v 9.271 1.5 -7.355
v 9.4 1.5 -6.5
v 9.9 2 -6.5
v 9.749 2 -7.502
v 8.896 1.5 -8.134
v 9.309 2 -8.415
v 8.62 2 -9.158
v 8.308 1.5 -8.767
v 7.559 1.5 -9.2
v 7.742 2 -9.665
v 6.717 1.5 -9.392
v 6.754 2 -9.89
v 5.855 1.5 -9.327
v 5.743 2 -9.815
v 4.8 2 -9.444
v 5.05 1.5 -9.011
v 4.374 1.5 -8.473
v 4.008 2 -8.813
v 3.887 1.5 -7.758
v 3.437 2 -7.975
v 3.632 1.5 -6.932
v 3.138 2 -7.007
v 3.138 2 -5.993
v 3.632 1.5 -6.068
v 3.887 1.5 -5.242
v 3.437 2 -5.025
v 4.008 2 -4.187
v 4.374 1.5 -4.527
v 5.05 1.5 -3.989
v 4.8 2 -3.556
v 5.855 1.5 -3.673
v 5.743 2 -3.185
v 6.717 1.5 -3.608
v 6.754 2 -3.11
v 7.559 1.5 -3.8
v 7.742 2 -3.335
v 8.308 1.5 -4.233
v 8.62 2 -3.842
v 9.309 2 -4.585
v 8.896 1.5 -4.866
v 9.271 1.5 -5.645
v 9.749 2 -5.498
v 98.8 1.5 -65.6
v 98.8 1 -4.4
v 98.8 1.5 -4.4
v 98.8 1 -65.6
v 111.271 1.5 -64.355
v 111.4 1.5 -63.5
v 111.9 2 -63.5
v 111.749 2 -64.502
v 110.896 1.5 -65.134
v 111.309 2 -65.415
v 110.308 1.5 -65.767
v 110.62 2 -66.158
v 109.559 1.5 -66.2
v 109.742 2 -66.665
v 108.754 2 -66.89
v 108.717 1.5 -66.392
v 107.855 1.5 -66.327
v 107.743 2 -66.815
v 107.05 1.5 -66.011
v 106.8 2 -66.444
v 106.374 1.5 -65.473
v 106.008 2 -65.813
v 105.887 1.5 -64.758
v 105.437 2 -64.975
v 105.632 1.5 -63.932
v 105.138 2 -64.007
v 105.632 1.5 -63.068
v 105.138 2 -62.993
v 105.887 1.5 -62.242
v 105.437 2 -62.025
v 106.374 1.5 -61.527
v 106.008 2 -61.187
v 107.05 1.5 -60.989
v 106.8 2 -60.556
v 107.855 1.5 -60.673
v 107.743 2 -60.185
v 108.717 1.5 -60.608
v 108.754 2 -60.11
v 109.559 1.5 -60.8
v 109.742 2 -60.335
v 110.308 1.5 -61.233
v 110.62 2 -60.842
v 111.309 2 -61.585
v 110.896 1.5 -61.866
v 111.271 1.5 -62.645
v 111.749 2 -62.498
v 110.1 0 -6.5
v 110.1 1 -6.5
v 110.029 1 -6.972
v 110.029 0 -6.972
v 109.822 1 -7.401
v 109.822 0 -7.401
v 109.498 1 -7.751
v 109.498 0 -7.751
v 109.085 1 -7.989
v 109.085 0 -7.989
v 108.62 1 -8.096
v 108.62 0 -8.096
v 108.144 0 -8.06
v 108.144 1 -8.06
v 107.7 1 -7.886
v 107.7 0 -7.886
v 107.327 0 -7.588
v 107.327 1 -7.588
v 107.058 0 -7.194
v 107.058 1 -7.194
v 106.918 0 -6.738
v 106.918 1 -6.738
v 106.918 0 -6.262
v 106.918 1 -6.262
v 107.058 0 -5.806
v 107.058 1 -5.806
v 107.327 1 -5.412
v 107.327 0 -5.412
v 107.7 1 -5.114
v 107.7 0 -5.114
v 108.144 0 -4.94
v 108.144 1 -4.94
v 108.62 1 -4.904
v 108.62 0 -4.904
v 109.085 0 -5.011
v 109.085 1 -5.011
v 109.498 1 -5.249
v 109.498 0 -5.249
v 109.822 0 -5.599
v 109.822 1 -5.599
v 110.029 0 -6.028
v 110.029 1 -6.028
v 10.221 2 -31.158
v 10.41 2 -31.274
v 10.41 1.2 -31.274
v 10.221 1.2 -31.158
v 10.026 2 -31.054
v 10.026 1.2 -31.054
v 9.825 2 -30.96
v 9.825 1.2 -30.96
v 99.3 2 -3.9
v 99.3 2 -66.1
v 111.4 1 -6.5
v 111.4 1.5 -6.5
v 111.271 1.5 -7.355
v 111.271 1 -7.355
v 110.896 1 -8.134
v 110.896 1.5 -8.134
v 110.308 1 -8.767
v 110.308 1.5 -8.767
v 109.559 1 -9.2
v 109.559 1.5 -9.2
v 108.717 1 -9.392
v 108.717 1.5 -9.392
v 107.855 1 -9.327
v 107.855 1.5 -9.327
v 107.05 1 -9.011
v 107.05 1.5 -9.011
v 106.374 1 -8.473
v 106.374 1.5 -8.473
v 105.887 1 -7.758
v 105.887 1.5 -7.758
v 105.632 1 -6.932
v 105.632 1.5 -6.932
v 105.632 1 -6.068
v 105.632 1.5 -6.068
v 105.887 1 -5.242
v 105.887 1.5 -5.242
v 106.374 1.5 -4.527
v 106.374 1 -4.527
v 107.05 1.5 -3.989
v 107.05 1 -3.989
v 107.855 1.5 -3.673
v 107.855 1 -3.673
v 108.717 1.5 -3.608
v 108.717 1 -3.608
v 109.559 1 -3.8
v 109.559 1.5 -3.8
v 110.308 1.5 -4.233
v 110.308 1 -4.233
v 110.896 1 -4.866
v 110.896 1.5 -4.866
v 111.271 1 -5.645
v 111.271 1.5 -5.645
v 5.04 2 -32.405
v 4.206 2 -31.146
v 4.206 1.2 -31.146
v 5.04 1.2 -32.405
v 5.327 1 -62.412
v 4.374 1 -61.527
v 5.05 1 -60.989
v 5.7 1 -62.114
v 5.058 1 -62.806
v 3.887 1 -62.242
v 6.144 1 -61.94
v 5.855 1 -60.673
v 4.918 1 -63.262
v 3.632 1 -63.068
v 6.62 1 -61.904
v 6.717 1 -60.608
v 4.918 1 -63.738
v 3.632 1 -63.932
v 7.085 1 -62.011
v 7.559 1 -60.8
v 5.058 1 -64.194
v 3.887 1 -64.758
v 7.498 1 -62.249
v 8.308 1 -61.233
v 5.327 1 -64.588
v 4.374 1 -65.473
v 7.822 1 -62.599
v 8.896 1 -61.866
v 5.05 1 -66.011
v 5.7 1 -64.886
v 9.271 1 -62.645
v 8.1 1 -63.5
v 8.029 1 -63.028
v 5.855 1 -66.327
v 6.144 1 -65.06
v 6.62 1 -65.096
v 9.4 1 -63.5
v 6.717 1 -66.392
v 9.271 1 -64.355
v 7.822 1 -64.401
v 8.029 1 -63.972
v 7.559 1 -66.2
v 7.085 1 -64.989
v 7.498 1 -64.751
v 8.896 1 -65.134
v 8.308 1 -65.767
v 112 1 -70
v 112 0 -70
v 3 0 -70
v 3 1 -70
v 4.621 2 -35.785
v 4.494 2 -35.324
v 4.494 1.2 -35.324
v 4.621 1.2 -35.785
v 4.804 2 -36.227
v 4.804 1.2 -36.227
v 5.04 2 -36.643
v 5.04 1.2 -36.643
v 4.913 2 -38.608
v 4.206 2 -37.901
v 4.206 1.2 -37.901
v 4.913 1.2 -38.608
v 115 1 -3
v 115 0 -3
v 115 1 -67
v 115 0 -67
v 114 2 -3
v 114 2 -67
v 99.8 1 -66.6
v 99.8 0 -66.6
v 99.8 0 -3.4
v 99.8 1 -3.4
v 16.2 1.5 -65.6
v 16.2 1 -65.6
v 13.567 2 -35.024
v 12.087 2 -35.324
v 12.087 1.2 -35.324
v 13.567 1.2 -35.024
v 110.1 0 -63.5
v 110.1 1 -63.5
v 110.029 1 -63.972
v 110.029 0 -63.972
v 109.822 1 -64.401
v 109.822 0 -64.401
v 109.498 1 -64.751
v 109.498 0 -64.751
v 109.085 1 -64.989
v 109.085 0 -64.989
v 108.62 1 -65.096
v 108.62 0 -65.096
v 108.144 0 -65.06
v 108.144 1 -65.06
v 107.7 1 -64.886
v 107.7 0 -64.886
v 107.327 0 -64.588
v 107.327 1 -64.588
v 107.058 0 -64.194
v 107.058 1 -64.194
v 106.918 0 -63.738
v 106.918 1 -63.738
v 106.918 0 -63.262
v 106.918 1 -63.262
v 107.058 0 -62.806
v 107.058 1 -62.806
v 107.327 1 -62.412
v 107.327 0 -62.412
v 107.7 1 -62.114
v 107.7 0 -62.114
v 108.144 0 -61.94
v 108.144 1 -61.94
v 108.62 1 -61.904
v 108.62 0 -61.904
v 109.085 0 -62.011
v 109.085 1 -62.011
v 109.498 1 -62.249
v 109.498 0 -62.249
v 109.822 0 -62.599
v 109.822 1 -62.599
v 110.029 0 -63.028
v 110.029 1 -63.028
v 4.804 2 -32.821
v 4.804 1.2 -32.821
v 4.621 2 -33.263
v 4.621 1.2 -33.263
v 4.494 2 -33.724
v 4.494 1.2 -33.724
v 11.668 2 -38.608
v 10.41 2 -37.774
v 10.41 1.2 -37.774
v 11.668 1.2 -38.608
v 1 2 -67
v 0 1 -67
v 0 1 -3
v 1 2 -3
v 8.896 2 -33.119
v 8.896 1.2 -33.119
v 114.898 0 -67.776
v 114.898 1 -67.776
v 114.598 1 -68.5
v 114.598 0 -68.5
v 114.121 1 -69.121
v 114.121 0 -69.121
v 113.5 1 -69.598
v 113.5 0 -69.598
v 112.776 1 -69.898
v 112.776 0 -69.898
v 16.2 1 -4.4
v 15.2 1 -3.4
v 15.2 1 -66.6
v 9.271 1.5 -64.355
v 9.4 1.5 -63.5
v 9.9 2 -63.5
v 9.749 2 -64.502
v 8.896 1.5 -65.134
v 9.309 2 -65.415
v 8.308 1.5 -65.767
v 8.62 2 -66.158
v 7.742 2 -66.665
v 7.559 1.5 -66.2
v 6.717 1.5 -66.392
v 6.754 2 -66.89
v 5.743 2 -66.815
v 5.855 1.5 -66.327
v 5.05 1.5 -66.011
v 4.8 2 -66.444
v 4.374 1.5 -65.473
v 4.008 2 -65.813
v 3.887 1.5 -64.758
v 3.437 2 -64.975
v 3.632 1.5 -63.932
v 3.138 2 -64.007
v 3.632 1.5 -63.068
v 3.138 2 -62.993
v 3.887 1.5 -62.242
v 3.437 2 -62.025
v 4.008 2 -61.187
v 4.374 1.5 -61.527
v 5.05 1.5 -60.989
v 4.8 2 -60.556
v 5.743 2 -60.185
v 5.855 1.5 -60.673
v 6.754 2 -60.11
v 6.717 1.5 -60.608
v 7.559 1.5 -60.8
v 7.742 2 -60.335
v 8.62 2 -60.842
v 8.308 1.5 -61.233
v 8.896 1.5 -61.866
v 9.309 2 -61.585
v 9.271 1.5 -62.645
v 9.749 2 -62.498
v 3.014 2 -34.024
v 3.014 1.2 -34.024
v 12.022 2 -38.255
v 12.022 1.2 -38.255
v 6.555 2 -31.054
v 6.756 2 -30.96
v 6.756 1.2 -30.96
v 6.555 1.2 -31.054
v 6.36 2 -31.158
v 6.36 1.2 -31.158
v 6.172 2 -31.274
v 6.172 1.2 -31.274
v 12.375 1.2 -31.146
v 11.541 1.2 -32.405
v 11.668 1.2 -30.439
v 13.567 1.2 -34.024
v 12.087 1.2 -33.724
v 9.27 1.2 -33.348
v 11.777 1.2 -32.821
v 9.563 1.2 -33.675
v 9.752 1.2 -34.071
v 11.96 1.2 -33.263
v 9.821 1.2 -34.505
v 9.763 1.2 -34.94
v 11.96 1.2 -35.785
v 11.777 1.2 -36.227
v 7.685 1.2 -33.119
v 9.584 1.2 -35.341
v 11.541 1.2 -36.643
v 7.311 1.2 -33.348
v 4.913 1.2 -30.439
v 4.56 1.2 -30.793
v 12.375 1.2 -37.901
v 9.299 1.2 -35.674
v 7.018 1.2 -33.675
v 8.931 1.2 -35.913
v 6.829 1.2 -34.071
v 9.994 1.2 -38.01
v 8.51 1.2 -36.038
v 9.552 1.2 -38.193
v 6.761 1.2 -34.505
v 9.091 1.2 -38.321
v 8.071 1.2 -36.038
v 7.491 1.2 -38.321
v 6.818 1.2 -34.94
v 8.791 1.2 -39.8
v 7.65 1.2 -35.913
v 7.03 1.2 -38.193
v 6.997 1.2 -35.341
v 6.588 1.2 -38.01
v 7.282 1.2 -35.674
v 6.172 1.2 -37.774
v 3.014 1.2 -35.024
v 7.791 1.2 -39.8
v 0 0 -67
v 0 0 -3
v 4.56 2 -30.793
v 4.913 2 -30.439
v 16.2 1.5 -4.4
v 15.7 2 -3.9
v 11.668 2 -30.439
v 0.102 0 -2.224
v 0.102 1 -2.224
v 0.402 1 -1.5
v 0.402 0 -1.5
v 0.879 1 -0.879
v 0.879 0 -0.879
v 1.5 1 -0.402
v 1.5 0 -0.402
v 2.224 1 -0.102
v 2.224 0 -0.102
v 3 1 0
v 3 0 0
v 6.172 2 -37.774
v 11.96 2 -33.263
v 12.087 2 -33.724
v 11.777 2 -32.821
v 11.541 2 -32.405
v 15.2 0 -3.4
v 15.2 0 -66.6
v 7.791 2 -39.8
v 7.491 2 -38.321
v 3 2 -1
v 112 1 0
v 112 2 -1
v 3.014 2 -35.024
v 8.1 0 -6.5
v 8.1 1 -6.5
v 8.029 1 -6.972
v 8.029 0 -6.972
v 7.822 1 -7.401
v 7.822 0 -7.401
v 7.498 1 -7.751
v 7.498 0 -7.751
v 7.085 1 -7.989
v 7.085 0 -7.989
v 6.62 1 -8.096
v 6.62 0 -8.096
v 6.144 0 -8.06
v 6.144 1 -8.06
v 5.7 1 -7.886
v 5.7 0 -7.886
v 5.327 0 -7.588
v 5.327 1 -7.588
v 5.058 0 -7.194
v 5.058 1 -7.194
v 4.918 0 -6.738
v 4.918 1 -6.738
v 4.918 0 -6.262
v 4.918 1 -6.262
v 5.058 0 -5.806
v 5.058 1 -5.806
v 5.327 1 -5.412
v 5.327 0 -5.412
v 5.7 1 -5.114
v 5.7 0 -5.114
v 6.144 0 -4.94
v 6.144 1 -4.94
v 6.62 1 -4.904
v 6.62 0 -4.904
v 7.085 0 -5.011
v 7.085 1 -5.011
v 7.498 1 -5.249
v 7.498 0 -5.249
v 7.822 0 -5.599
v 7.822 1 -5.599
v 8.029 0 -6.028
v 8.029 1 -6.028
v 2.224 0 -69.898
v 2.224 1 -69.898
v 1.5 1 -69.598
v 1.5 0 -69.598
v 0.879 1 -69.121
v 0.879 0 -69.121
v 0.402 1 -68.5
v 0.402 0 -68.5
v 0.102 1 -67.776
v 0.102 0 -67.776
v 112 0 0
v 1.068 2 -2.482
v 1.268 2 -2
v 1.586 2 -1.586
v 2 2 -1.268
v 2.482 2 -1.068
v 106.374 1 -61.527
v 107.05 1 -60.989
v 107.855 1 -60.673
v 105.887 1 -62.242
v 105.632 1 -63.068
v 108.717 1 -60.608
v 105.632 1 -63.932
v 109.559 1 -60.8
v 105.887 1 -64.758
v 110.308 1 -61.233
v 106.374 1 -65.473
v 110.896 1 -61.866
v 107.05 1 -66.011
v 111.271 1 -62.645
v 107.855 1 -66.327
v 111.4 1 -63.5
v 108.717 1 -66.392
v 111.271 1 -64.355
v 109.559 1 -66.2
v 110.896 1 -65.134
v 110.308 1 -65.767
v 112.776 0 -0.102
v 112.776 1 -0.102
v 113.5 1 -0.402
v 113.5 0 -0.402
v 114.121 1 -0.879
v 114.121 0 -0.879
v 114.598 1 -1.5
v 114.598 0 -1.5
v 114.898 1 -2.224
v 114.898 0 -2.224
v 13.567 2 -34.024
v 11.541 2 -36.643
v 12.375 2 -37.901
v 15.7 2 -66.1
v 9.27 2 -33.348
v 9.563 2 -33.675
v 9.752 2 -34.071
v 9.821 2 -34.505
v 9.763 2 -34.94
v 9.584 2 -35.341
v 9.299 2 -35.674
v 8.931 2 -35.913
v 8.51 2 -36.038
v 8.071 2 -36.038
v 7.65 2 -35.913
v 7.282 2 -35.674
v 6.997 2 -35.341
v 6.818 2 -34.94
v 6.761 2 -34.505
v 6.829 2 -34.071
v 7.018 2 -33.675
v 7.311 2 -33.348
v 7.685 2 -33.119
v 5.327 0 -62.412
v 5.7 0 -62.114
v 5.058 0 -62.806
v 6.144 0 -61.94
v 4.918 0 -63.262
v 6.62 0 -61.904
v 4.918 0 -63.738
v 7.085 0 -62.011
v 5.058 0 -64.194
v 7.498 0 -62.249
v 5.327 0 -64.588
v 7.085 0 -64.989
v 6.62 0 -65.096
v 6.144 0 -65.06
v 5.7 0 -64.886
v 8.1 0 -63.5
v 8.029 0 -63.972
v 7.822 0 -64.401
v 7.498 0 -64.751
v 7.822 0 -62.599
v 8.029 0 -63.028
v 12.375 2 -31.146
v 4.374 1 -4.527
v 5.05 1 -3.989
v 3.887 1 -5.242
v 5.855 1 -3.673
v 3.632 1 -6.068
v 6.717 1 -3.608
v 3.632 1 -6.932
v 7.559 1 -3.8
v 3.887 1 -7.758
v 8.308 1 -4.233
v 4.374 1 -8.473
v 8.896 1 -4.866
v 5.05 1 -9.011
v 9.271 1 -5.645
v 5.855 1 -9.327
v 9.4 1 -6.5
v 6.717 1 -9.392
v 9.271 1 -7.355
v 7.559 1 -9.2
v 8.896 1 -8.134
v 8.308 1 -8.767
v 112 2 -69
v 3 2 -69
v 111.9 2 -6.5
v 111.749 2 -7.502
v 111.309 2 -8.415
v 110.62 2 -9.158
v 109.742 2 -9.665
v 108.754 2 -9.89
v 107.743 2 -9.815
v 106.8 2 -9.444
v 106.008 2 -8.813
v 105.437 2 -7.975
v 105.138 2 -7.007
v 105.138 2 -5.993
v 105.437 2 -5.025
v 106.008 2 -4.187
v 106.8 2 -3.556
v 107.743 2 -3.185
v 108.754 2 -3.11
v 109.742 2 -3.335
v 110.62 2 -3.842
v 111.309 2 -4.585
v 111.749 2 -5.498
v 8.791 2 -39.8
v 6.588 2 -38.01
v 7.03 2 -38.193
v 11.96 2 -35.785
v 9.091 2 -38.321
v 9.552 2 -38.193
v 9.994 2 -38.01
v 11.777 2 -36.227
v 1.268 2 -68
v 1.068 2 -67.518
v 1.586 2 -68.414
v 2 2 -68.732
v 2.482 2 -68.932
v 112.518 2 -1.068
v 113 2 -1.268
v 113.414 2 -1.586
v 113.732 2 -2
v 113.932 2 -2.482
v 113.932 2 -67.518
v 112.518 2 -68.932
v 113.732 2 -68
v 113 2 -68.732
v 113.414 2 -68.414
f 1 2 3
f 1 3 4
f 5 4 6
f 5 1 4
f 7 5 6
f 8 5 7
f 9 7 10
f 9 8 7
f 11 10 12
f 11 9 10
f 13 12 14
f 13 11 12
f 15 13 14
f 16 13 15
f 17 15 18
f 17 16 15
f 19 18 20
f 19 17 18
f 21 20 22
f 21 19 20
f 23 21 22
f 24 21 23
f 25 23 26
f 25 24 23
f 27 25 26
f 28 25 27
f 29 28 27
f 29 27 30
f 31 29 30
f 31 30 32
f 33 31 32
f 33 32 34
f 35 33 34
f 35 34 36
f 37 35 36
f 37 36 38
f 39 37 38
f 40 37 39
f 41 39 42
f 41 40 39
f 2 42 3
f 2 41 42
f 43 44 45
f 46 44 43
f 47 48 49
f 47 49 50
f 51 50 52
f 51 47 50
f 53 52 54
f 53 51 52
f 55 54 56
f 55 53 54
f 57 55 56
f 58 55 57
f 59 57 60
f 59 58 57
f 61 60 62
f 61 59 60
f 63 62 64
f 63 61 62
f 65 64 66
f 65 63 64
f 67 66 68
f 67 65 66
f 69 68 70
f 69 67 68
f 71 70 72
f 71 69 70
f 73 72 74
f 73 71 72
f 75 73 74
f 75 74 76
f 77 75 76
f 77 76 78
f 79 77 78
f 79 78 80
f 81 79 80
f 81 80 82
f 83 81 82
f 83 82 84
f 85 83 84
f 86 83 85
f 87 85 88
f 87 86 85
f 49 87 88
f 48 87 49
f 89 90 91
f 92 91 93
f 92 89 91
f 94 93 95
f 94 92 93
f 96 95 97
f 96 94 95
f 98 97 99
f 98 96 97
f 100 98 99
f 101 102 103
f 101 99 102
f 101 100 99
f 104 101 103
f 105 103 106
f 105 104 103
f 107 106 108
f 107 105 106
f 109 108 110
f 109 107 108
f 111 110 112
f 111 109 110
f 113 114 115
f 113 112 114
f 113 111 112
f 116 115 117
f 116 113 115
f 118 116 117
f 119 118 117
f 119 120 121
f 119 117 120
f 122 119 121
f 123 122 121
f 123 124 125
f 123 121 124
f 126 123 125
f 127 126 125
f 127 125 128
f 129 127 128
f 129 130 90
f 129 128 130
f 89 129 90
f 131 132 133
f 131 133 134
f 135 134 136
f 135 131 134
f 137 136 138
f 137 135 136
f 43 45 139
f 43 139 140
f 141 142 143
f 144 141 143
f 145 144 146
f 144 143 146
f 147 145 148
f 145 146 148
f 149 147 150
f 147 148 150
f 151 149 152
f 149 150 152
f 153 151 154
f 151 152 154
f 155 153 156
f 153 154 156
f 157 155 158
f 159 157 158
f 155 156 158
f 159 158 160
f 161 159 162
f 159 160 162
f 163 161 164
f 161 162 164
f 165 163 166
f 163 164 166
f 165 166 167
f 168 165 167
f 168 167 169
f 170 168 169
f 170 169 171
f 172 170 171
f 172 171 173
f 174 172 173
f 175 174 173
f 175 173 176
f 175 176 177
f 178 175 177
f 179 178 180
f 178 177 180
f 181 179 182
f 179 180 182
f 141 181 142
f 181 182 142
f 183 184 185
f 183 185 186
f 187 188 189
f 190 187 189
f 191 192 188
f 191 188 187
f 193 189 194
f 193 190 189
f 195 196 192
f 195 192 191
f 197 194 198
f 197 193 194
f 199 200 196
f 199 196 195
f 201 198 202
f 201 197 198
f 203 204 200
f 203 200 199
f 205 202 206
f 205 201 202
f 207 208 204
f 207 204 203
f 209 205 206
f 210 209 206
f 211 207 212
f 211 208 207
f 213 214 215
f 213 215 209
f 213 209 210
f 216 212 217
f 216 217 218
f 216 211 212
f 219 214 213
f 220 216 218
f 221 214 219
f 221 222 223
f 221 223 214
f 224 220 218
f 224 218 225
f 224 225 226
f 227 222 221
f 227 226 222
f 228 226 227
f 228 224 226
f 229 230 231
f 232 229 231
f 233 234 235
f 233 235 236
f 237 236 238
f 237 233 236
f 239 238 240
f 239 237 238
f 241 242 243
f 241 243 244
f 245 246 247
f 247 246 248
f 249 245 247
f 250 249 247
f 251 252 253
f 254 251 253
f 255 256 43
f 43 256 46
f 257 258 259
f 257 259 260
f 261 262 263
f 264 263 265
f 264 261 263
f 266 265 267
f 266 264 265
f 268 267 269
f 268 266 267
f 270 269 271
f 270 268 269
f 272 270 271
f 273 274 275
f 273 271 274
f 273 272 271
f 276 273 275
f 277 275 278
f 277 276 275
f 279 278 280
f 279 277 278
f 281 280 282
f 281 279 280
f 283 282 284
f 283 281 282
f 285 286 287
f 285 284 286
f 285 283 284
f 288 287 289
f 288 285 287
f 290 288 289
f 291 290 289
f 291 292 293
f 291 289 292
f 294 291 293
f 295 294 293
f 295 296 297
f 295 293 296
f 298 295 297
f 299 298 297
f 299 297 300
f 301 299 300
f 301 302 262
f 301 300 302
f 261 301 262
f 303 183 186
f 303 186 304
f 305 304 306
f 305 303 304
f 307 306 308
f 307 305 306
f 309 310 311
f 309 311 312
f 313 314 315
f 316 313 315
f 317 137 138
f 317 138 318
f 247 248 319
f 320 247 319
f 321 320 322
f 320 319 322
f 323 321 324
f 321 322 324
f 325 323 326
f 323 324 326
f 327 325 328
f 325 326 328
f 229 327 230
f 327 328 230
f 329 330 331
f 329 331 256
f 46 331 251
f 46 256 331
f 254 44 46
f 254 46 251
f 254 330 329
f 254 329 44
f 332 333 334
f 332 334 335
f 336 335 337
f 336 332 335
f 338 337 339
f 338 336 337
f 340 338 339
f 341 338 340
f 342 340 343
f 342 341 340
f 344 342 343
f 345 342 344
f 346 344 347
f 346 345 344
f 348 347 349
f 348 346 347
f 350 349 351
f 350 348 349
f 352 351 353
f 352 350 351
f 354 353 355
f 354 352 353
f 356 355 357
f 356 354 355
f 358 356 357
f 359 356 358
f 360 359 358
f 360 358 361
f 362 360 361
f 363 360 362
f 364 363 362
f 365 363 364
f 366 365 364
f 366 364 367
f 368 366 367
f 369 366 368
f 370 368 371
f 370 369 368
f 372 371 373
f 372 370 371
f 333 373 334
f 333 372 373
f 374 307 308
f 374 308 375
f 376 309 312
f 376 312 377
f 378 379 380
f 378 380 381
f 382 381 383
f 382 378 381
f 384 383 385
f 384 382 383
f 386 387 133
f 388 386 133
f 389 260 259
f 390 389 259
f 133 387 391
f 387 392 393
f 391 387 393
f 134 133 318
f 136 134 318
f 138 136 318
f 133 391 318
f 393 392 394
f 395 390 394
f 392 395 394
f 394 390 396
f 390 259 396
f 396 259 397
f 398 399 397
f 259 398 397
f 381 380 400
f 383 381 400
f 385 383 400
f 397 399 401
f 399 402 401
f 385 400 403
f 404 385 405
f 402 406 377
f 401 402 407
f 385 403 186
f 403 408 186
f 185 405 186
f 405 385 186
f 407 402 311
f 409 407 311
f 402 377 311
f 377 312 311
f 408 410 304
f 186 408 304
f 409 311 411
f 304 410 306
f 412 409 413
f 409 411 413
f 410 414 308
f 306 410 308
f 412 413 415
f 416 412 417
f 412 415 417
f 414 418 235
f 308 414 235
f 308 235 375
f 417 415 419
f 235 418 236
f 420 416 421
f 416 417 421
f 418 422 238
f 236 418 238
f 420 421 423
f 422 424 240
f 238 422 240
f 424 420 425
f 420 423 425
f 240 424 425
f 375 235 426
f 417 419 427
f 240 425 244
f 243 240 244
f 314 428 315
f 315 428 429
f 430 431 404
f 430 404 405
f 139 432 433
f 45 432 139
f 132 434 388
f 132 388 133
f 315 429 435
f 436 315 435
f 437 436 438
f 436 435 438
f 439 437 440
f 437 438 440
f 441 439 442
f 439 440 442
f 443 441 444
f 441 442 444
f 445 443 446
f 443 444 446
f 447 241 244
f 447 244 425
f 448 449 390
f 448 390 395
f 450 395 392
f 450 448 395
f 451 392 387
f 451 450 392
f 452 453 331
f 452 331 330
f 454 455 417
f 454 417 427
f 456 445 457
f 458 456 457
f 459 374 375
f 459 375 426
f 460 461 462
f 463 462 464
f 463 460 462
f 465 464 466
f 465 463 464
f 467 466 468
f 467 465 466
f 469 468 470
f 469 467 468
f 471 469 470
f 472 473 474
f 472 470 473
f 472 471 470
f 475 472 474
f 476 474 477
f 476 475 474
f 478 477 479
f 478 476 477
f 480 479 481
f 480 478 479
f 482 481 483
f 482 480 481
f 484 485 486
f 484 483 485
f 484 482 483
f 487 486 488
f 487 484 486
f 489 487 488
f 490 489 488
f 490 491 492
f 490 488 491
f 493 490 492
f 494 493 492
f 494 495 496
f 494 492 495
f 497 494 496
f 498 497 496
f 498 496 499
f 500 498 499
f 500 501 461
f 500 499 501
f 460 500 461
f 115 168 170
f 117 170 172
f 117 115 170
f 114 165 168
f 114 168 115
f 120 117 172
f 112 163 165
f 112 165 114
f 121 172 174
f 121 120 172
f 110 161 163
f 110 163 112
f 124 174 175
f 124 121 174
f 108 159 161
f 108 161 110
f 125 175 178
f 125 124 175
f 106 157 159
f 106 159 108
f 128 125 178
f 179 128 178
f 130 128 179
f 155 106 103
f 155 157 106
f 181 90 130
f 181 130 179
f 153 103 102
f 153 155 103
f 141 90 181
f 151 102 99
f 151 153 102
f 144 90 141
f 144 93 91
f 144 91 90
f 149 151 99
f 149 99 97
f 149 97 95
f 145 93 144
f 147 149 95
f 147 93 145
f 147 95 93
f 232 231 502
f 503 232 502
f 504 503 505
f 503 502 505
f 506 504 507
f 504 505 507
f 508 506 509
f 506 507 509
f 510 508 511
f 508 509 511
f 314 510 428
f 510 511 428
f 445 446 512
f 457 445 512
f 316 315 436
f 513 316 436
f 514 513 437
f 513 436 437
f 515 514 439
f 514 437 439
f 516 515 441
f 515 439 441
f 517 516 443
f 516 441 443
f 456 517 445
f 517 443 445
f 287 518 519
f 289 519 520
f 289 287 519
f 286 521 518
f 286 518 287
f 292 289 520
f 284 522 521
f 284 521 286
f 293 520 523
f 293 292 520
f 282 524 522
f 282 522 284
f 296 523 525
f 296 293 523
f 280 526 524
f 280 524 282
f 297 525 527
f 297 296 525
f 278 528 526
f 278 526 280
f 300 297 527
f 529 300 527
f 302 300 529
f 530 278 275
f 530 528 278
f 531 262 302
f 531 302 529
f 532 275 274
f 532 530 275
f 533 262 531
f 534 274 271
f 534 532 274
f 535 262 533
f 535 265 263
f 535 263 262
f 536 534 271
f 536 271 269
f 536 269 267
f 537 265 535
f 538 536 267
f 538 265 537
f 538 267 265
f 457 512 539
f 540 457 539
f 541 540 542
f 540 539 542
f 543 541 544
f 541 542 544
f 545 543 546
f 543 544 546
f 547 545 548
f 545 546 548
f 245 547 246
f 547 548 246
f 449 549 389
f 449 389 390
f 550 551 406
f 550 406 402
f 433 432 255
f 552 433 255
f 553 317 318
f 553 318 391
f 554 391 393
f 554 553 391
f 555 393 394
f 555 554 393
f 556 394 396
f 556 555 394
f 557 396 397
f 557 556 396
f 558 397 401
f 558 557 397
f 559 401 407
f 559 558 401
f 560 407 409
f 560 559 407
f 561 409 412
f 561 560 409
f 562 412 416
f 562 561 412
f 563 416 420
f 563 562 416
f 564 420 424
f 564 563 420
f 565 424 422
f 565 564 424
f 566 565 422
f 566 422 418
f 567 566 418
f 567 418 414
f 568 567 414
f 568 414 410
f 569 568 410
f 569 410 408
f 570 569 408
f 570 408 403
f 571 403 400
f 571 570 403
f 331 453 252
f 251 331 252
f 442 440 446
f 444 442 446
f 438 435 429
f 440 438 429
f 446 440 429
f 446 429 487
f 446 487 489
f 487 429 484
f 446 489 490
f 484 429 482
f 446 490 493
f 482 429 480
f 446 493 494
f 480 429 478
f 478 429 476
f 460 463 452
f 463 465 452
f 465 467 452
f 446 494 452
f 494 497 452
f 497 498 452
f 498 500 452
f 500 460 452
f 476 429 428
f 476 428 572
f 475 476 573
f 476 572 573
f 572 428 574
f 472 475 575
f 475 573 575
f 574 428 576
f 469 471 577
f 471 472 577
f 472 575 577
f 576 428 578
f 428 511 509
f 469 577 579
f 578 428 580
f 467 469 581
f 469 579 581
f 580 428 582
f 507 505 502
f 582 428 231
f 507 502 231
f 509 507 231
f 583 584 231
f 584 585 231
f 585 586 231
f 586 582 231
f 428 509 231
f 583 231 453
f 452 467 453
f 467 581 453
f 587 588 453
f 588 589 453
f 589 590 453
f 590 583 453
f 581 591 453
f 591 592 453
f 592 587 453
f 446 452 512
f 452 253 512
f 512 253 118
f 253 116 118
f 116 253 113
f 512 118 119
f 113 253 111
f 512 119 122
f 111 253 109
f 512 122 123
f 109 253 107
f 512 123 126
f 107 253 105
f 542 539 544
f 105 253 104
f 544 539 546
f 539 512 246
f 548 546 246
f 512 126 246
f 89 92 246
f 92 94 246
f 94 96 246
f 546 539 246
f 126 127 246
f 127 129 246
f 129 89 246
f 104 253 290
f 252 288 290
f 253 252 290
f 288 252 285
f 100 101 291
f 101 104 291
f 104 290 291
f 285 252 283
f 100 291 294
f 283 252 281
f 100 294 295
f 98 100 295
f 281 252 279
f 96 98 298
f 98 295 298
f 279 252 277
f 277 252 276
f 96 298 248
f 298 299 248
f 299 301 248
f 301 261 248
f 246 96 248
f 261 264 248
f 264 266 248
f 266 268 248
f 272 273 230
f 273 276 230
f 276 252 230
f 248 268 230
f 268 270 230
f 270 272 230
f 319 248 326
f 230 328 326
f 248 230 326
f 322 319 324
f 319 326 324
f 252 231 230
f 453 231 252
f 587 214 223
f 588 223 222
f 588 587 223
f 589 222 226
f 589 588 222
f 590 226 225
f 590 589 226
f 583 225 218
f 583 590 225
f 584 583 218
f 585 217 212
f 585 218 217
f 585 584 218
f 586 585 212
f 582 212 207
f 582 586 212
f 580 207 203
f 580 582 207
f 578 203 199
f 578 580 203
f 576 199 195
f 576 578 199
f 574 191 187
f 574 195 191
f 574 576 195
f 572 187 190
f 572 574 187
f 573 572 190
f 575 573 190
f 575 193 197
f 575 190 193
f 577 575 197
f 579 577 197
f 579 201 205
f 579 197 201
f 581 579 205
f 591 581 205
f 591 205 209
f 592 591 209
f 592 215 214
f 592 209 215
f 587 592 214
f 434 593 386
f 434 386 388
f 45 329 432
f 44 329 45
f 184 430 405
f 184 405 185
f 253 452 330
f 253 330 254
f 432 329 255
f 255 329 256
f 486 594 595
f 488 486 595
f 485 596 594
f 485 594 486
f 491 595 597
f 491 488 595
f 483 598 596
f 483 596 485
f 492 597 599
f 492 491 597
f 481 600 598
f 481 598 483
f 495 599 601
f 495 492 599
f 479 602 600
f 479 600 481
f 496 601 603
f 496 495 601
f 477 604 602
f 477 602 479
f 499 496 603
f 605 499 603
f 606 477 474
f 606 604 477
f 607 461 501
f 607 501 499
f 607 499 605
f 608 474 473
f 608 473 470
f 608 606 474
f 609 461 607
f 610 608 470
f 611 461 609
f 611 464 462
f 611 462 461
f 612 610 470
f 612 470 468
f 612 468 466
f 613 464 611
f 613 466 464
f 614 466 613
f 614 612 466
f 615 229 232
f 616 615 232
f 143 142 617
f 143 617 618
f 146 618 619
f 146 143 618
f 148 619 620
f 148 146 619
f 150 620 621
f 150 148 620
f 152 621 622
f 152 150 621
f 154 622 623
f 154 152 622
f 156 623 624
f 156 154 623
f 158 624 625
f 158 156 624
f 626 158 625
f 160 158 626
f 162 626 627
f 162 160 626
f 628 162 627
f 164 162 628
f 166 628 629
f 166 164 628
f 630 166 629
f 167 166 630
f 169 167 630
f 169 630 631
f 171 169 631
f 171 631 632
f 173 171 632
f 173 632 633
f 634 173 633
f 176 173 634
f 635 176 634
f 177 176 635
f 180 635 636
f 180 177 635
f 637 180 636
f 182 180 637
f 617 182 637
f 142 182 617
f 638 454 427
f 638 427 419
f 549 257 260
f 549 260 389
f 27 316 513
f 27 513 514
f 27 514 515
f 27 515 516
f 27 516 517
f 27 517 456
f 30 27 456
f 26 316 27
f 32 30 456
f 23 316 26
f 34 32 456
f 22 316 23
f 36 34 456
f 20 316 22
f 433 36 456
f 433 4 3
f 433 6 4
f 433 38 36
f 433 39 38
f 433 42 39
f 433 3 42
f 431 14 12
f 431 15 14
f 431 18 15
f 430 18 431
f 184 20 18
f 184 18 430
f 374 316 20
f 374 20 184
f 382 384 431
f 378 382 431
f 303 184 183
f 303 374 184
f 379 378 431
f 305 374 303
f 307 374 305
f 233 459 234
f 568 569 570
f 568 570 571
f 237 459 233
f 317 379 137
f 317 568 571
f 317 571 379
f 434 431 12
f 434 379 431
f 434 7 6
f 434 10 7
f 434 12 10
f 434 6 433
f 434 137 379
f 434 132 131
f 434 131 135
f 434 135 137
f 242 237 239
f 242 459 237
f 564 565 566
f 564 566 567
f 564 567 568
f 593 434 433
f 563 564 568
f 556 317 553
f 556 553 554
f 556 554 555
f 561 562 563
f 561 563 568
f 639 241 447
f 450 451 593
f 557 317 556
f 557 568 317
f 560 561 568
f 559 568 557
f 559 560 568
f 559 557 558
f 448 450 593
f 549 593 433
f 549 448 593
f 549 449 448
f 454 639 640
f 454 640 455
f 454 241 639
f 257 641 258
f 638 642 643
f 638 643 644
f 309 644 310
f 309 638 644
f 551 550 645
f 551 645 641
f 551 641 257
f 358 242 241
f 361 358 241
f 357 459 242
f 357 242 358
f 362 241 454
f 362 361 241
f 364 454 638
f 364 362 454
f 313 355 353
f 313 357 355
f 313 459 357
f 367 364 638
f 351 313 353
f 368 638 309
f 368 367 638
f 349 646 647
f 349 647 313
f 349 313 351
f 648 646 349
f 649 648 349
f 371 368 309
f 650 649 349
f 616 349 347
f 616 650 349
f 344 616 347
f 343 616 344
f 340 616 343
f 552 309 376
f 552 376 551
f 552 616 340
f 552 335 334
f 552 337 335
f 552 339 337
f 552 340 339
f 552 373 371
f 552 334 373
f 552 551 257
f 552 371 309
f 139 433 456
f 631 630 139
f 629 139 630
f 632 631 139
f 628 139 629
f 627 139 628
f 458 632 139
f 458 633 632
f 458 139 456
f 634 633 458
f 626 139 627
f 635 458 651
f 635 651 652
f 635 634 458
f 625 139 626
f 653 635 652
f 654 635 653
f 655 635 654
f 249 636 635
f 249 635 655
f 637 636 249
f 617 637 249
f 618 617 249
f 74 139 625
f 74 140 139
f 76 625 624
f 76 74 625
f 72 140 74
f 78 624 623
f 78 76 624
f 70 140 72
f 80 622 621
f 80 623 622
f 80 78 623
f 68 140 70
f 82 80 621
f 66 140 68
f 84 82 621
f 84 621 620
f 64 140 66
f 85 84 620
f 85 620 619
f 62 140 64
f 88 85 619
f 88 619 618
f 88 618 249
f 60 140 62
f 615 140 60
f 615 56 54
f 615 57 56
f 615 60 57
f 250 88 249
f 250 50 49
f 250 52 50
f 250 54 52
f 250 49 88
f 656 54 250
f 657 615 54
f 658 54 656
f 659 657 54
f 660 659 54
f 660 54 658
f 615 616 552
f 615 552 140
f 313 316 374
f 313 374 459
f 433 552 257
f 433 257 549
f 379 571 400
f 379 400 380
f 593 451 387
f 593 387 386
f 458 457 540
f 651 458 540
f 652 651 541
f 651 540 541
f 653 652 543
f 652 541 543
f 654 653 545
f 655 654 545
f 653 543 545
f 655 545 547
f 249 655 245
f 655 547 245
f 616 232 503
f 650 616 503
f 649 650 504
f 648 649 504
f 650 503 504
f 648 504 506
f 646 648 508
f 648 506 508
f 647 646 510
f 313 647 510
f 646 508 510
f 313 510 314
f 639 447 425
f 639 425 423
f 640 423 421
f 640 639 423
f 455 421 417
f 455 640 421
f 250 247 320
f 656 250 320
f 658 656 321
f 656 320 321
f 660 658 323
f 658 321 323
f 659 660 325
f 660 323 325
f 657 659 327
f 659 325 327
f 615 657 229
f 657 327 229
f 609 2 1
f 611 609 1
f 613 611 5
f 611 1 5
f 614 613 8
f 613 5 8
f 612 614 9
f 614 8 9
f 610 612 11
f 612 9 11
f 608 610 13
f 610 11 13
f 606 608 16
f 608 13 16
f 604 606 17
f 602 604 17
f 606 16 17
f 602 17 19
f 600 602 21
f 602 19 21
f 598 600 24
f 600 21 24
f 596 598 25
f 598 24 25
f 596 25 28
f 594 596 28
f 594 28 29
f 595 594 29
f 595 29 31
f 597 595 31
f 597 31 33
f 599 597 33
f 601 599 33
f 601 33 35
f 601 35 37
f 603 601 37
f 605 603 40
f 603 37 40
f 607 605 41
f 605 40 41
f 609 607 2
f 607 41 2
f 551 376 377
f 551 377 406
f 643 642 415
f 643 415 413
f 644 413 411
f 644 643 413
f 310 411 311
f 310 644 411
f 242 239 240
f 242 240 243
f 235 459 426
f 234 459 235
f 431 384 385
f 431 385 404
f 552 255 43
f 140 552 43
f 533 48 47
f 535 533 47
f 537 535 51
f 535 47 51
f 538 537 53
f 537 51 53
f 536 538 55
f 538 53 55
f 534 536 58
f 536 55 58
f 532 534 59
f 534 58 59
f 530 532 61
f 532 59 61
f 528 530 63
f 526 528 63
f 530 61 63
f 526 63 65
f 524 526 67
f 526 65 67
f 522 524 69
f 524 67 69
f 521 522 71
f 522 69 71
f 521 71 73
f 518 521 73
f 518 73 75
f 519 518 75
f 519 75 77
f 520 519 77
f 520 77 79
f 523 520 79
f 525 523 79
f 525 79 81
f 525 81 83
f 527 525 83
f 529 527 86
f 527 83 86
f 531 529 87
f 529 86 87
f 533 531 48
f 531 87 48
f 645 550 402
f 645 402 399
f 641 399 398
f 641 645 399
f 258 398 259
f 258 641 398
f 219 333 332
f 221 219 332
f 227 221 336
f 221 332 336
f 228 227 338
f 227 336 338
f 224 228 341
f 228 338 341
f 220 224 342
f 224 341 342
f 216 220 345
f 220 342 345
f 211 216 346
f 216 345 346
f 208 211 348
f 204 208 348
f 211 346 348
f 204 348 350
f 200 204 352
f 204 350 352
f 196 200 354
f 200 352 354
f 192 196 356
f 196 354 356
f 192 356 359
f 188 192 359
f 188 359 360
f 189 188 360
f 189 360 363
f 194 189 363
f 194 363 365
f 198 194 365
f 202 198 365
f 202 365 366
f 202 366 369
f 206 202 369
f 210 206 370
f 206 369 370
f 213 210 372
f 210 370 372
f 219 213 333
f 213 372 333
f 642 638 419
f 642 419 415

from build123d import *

# Parameters (mm, degrees)
SKETCH1_R           = 1.6
SKETCH1_W           = 82.6
SKETCH1_H           = 61.2
BOSS_EXTRUDE1_DEPTH = 2
SKETCH2_W           = 84.6
SKETCH2_H           = 63.2
CUT_EXTRUDE1_DEPTH  = 1
CHAMFER1_SIZE       = 0.5
SKETCH3_R           = 2.9
CUT_EXTRUDE2_DEPTH  = 1
CHAMFER2_SIZE       = 0.5
CHAMFER3_SIZE       = 1
CUT_EXTRUDE3_DEPTH  = 0.8


with BuildPart() as part:
    # Sketch1 → Boss-Extrude1 (new body)
    with BuildSketch(Plane(origin=(0, 0, 0), x_dir=(1, 0, 0), z_dir=(0, 1, 0))):
        with BuildLine():
            Line((3, 0), (112, 0))
            ThreePointArc((112, 0), (114.121320344, 0.878679656), (115, 3))
            Line((115, 3), (115, 67))
            ThreePointArc((115, 67), (114.121320344, 69.121320344), (112, 70))
            Line((112, 70), (3, 70))
            ThreePointArc((3, 70), (0.878679656, 69.121320344), (0, 67))
            Line((0, 67), (0, 3))
            ThreePointArc((0, 3), (0.878679656, 0.878679656), (3, 0))
        make_face()
        with Locations((6.5, 63.5)):
            Circle(SKETCH1_R, mode=Mode.SUBTRACT)
        with Locations((6.5, 6.5)):
            Circle(SKETCH1_R, mode=Mode.SUBTRACT)
        with Locations((108.5, 6.5)):
            Circle(SKETCH1_R, mode=Mode.SUBTRACT)
        with Locations((108.5, 63.5)):
            Circle(SKETCH1_R, mode=Mode.SUBTRACT)
        with Locations((57.5, 35)):
            Rectangle(SKETCH1_W, SKETCH1_H, mode=Mode.SUBTRACT)
    extrude(amount=BOSS_EXTRUDE1_DEPTH)

    # Sketch2 → Cut-Extrude1 (cut)
    with BuildSketch(Plane.XZ):
        with Locations((57.5, -35)):
            Rectangle(SKETCH2_W, SKETCH2_H)
    extrude(amount=-CUT_EXTRUDE1_DEPTH, mode=Mode.SUBTRACT)

    # Chamfer1
    chamfer1_edges = [part.edges().sort_by_distance(p)[0] for p in [
        (16.2, 2, -35),
        (57.5, 2, -4.4),
        (98.8, 2, -35),
        (57.5, 2, -65.6),
    ]]
    chamfer(chamfer1_edges, length=CHAMFER1_SIZE)

    # Sketch3 → Cut-Extrude2 (cut)
    with BuildSketch(Plane(origin=(0, 2, 0), x_dir=(1, 0, 0), z_dir=(0, 1, 0))):
        with Locations((6.5, 63.5)):
            Circle(SKETCH3_R)
        with Locations((108.5, 63.5)):
            Circle(SKETCH3_R)
        with Locations((108.5, 6.5)):
            Circle(SKETCH3_R)
        with Locations((6.5, 6.5)):
            Circle(SKETCH3_R)
    extrude(amount=-CUT_EXTRUDE2_DEPTH, mode=Mode.SUBTRACT)

    # Chamfer2
    chamfer2_edges = [part.edges().sort_by_distance(p)[0] for p in [
        (105.6, 2, -63.5),
        (3.6, 2, -63.5),
        (3.6, 2, -6.5),
        (105.6, 2, -6.5),
    ]]
    chamfer(chamfer2_edges, length=CHAMFER2_SIZE)

    # Chamfer3
    chamfer3_edges = [part.edges().sort_by_distance(p)[0] for p in [
        (114.121320344, 2, -0.878679656),
        (115, 2, -35),
        (114.121320344, 2, -69.121320344),
        (57.5, 2, -70),
        (0.878679656, 2, -69.121320344),
        (0, 2, -35),
        (0.878679656, 2, -0.878679656),
        (57.5, 2, 0),
    ]]
    chamfer(chamfer3_edges, length=CHAMFER3_SIZE)

    # Sketch4 → Cut-Extrude3 (cut)
    with BuildSketch(Plane(origin=(0, 2, 0), x_dir=(1, 0, 0), z_dir=(0, 1, 0))):
        with BuildLine():
            Line((9.825395701, 30.960299483), (8.89586377, 33.118648479))
            ThreePointArc((8.89586377, 33.118648479), (8.290679151, 36.053871442), (7.685494532, 33.118648479))
            Line((7.685494532, 33.118648479), (6.755962601, 30.960299483))
            ThreePointArc((6.755962601, 30.960299483), (6.457149652, 31.104431492), (6.171741697, 31.273563139))
            Line((6.171741697, 31.273563139), (4.91328092, 30.43936643))
            Line((4.91328092, 30.43936643), (4.55972753, 30.792919821))
            Line((4.55972753, 30.792919821), (4.206174139, 31.146473212))
            Line((4.206174139, 31.146473212), (5.040370847, 32.404933989))
            ThreePointArc((5.040370847, 32.404933989), (4.706026565, 33.039059725), (4.494049066, 33.723871442))
            Line((4.494049066, 33.723871442), (3.014316768, 34.023871442))
            Line((3.014316768, 34.023871442), (3.014316768, 34.523871442))
            Line((3.014316768, 34.523871442), (3.014316768, 35.023871442))
            Line((3.014316768, 35.023871442), (4.494049066, 35.323871442))
            ThreePointArc((4.494049066, 35.323871442), (4.706026565, 36.00868316), (5.040370847, 36.642808896))
            Line((5.040370847, 36.642808896), (4.206174139, 37.901269673))
            Line((4.206174139, 37.901269673), (4.55972753, 38.254823064))
            Line((4.55972753, 38.254823064), (4.91328092, 38.608376454))
            Line((4.91328092, 38.608376454), (6.171741697, 37.774179746))
            ThreePointArc((6.171741697, 37.774179746), (6.805867433, 38.108524028), (7.490679151, 38.320501527))
            Line((7.490679151, 38.320501527), (7.790679151, 39.800233826))
            Line((7.790679151, 39.800233826), (8.290679151, 39.800233826))
            Line((8.290679151, 39.800233826), (8.790679151, 39.800233826))
            Line((8.790679151, 39.800233826), (9.090679151, 38.320501527))
            ThreePointArc((9.090679151, 38.320501527), (9.775490868, 38.108524028), (10.409616604, 37.774179746))
            Line((10.409616604, 37.774179746), (11.668077381, 38.608376454))
            Line((11.668077381, 38.608376454), (12.021630772, 38.254823064))
            Line((12.021630772, 38.254823064), (12.375184163, 37.901269673))
            Line((12.375184163, 37.901269673), (11.540987454, 36.642808896))
            ThreePointArc((11.540987454, 36.642808896), (11.875331737, 36.00868316), (12.087309236, 35.323871442))
            Line((12.087309236, 35.323871442), (13.567041534, 35.023871442))
            Line((13.567041534, 35.023871442), (13.567041534, 34.523871442))
            Line((13.567041534, 34.523871442), (13.567041534, 34.023871442))
            Line((13.567041534, 34.023871442), (12.087309236, 33.723871442))
            ThreePointArc((12.087309236, 33.723871442), (11.875331737, 33.039059725), (11.540987454, 32.404933989))
            Line((11.540987454, 32.404933989), (12.375184163, 31.146473212))
            Line((12.375184163, 31.146473212), (12.021630772, 30.792919821))
            Line((12.021630772, 30.792919821), (11.668077381, 30.43936643))
            Line((11.668077381, 30.43936643), (10.409616604, 31.273563139))
            ThreePointArc((10.409616604, 31.273563139), (10.12420865, 31.104431492), (9.825395701, 30.960299483))
        make_face()
    extrude(amount=-CUT_EXTRUDE3_DEPTH, mode=Mode.SUBTRACT)


solid = part.part
